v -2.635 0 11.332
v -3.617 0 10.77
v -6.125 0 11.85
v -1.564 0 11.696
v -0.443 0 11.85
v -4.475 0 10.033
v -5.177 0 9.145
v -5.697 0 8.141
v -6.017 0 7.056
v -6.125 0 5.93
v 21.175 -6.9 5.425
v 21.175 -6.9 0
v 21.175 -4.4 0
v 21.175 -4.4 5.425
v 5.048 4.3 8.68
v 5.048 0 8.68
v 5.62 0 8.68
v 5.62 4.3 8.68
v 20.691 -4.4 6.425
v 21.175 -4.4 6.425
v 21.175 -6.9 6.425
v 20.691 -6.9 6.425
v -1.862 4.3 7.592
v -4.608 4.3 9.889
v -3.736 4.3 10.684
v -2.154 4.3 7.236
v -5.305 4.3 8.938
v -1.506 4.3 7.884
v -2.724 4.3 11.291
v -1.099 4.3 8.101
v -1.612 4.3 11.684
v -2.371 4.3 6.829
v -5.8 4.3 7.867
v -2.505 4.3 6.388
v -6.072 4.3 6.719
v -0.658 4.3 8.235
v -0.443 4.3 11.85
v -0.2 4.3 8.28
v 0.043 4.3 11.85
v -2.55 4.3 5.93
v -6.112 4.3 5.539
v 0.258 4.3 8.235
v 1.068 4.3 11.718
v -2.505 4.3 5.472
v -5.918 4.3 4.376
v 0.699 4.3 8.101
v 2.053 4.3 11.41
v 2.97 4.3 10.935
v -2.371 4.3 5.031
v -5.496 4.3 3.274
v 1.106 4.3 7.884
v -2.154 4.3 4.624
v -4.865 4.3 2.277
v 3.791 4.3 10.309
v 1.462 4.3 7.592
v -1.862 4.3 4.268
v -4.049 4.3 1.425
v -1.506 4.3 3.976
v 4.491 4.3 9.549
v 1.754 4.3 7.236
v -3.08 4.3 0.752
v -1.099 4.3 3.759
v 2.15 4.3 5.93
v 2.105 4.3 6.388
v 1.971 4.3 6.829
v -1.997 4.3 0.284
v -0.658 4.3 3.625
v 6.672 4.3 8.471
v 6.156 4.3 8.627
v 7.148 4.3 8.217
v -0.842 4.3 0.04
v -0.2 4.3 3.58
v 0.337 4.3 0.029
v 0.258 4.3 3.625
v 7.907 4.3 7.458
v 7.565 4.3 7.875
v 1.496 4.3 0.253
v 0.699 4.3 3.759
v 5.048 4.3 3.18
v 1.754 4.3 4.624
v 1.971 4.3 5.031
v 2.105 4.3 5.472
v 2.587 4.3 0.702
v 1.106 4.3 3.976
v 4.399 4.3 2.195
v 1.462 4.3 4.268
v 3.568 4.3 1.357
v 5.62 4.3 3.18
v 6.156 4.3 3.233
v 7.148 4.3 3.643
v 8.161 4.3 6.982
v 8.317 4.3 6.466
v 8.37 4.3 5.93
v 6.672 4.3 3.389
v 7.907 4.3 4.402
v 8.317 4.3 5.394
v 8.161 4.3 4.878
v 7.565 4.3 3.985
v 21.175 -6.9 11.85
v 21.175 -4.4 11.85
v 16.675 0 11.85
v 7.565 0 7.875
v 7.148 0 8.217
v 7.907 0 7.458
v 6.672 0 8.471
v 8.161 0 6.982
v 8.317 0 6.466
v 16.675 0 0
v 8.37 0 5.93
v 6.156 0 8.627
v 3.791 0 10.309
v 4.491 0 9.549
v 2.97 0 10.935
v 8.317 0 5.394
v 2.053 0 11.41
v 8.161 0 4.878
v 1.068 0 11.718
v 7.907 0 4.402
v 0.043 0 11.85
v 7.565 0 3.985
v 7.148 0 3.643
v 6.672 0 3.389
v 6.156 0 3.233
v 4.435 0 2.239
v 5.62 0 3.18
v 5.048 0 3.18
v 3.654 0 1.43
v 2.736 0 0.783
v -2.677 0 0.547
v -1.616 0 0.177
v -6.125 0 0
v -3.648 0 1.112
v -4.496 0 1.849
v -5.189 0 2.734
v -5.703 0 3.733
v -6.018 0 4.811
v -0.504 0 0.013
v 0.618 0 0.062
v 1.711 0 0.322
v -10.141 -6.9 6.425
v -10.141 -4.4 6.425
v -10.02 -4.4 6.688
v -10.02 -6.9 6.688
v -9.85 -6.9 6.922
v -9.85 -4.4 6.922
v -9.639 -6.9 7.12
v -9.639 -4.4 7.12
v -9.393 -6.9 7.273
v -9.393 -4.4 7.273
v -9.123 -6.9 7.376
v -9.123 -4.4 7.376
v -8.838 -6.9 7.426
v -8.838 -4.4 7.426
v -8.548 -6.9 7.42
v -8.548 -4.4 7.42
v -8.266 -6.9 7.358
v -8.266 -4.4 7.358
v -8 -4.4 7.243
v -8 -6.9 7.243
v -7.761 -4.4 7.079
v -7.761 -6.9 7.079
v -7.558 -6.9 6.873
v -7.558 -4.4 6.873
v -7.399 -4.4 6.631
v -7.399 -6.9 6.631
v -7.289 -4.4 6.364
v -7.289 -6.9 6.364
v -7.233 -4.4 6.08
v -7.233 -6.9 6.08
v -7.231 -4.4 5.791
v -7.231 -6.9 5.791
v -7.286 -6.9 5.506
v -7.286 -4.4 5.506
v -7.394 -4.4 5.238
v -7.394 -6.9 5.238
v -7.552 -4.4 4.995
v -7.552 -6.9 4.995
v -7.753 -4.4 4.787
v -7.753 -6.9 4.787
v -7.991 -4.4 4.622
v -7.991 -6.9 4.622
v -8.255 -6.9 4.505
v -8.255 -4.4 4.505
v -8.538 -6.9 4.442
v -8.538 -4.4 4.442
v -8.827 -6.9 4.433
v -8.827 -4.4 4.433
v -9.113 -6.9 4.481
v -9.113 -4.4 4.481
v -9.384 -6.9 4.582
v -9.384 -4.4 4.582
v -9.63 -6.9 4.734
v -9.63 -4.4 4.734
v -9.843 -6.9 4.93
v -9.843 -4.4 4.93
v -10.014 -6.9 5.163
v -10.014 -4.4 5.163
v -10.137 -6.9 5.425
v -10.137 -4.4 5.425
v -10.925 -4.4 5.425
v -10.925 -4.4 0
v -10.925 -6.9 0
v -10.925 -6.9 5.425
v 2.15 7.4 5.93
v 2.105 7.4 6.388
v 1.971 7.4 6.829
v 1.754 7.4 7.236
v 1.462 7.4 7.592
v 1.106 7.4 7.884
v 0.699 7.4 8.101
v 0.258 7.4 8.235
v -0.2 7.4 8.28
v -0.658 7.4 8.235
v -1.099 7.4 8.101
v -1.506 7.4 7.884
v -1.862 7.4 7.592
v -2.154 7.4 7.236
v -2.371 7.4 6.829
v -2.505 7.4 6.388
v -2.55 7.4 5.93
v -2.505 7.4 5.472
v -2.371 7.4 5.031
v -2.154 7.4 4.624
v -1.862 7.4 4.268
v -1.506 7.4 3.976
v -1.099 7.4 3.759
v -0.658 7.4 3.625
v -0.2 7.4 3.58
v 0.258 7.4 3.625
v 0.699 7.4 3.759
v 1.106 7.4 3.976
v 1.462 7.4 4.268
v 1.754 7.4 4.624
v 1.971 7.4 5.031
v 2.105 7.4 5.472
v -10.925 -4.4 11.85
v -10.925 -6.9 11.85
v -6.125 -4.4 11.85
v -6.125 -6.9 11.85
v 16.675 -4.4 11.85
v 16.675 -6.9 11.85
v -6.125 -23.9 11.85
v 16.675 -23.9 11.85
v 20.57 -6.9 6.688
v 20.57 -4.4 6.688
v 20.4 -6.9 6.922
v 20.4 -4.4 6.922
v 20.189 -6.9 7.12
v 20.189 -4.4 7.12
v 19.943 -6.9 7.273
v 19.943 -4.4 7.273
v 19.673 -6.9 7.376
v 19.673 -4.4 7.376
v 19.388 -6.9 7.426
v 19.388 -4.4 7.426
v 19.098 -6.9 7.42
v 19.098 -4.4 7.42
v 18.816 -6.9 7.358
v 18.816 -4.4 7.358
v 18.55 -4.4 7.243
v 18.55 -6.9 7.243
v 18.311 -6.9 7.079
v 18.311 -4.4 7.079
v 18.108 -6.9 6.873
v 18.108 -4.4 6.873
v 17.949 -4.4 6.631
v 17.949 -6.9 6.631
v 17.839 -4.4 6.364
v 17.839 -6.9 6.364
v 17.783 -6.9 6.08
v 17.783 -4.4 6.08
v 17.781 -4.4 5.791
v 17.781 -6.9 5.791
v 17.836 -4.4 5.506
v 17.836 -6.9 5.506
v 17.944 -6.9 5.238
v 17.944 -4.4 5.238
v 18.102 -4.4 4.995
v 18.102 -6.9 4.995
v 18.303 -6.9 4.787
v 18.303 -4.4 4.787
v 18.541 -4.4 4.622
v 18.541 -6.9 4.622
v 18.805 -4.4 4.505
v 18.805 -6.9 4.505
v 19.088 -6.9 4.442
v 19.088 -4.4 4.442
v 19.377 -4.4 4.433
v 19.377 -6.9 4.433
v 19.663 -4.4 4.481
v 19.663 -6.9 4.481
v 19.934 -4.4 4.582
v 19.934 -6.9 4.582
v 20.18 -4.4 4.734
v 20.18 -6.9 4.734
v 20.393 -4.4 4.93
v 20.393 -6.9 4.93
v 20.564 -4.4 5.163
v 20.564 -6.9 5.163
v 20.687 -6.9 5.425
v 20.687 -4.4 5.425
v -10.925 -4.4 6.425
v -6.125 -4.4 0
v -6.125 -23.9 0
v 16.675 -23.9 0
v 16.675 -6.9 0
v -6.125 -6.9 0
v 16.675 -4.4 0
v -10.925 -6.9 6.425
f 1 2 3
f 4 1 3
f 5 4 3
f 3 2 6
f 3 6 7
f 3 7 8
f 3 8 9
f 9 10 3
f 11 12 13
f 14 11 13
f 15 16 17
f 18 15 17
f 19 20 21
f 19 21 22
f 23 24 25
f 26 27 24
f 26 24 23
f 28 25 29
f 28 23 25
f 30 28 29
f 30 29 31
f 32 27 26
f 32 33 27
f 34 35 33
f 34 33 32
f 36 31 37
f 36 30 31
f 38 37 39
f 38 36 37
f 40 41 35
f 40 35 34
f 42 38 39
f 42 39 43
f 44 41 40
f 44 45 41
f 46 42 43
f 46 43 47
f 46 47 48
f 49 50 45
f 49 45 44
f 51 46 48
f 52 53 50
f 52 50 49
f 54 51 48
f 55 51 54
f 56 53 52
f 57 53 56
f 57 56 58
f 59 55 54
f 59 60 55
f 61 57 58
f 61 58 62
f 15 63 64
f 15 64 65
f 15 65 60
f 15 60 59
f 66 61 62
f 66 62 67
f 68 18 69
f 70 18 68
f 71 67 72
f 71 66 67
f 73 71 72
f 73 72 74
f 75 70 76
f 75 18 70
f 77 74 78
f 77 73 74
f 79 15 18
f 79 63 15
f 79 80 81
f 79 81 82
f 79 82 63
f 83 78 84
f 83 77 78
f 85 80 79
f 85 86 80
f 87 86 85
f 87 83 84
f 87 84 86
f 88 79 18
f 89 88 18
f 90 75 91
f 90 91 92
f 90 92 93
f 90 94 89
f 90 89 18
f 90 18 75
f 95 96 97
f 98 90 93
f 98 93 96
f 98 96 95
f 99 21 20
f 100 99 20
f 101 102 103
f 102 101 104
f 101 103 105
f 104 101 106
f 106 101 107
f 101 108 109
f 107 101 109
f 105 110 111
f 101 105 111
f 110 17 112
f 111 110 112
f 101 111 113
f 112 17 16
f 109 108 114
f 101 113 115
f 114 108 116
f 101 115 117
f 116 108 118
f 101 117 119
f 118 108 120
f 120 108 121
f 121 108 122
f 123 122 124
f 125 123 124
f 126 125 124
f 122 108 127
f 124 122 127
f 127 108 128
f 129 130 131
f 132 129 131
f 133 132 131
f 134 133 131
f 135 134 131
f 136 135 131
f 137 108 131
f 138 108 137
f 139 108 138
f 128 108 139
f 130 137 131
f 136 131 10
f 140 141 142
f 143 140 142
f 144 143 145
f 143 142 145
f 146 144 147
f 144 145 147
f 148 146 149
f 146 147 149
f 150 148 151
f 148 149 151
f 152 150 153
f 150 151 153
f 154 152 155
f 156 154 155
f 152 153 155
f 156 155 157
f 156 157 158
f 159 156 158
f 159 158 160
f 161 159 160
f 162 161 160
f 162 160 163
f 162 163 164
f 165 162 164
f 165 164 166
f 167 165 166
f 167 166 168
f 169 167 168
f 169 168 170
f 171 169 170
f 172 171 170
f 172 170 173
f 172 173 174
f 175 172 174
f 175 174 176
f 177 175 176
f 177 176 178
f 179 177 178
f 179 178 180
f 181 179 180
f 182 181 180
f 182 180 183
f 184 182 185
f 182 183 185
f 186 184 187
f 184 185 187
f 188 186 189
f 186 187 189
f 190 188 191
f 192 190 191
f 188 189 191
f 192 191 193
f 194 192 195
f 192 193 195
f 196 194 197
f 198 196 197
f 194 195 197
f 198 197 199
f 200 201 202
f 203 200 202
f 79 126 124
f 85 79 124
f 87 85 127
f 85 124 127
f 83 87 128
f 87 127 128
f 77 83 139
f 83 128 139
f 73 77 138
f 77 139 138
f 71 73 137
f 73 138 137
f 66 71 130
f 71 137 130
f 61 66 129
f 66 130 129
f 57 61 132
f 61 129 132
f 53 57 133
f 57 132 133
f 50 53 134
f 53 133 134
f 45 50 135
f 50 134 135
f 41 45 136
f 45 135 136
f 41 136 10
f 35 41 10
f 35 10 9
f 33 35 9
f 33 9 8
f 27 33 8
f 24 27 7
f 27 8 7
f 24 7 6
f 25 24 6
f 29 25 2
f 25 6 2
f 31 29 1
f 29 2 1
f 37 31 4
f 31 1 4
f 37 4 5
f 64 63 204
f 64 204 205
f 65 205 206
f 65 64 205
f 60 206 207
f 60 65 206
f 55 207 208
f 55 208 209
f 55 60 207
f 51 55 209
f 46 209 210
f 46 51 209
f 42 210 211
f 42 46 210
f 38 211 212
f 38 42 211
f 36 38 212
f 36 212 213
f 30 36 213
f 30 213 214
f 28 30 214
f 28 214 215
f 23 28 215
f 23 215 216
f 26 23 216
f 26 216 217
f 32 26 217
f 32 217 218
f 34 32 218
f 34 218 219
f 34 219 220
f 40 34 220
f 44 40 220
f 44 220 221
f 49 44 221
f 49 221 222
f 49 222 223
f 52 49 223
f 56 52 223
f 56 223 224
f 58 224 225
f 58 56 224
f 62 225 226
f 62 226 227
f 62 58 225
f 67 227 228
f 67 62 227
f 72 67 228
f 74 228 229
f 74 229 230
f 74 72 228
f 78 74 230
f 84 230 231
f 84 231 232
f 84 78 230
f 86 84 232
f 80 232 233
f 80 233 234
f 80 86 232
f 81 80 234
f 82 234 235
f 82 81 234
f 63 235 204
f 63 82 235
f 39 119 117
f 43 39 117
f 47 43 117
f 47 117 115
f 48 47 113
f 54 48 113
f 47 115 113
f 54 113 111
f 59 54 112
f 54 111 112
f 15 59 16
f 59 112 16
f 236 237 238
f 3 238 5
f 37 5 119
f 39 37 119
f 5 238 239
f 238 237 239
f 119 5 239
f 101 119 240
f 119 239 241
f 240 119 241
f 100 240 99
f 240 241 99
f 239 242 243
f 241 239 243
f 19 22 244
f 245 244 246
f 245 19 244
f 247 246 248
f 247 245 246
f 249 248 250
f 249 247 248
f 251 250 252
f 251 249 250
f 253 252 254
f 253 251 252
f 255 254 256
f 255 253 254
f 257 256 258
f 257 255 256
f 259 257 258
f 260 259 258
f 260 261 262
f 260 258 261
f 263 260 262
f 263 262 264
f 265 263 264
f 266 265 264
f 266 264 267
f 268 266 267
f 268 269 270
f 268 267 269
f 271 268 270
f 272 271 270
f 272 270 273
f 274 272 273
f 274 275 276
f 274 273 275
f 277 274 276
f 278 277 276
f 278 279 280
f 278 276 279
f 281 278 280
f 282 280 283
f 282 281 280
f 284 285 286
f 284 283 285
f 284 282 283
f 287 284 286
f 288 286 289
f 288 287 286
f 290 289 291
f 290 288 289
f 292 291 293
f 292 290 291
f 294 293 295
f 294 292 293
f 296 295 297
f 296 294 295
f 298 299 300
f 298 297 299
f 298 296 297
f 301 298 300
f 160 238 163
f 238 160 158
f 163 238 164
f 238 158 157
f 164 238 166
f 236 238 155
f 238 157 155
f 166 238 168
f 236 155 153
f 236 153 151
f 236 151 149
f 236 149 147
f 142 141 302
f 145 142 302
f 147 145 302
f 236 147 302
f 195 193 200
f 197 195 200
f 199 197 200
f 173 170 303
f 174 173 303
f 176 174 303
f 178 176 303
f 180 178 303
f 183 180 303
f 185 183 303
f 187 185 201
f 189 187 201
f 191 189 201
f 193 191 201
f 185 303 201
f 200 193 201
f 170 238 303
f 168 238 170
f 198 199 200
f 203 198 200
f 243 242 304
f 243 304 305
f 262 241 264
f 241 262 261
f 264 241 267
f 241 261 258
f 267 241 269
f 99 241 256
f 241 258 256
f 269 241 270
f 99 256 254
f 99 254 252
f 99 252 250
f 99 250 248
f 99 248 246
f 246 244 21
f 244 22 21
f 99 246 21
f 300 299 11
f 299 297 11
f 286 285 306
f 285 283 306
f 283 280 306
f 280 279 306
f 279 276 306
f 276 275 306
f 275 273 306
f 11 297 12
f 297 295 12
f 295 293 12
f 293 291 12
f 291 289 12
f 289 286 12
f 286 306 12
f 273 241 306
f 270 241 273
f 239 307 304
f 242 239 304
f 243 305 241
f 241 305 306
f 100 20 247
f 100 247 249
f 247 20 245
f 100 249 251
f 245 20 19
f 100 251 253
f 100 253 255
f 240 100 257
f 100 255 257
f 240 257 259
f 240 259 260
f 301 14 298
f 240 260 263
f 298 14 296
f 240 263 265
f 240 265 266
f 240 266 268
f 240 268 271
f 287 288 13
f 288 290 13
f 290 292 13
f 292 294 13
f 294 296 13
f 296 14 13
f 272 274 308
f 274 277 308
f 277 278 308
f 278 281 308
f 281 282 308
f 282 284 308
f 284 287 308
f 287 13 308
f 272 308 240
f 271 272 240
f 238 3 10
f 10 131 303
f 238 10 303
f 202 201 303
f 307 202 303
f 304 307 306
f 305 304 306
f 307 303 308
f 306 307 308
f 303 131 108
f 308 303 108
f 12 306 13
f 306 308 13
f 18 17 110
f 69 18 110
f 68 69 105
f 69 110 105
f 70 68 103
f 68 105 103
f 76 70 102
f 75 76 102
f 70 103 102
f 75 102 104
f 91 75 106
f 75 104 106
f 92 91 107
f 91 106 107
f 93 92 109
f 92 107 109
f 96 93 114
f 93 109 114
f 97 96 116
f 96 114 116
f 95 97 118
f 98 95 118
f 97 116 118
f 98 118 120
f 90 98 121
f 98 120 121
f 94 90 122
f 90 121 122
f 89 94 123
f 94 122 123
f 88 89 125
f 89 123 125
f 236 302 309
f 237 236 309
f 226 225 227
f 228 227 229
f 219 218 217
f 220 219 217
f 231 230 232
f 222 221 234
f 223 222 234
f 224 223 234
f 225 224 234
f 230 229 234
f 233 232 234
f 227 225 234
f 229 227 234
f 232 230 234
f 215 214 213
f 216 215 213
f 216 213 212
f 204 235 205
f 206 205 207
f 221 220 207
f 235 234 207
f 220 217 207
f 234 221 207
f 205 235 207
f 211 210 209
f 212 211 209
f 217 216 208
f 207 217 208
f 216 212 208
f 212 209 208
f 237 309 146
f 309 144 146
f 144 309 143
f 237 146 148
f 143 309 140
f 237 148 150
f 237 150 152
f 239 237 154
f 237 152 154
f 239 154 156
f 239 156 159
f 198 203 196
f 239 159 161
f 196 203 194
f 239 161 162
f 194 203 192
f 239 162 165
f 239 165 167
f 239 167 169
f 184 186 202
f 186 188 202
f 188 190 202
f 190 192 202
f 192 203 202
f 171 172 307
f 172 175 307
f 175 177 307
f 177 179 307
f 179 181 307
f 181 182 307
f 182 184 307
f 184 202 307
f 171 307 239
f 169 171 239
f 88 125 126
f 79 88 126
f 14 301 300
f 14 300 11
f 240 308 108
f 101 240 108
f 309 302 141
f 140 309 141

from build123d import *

# Parameters (mm, degrees)
BOSS_EXTRUDE1_DEPTH = 11.85
BOSS_EXTRUDE2_DEPTH = 4.3
SKETCH4_R           = 2.35
BOSS_EXTRUDE3_DEPTH = 31.3
CUT_EXTRUDE1_DEPTH  = 32.1


with BuildPart() as part:
    # Sketch1 → Boss-Extrude1 (new body)
    with BuildSketch(Plane.XY):
        Polygon((0, 0), (-6.125, 0), (-6.125, -4.4), (-10.925, -4.4), (-10.925, -6.9), (-6.125, -6.9), (-6.125, -23.9), (16.675, -23.9), (16.675, -6.9), (21.175, -6.9), (21.175, -4.4), (16.675, -4.4), (16.675, 0), align=None)
    extrude(amount=BOSS_EXTRUDE1_DEPTH)

    # Boss-Extrude2: read off the stored shape, not the designer's step
    # Boss-Extrude2 outline → Boss-Extrude2 (add)
    with BuildSketch(Plane(origin=(0, 0, 0), x_dir=(1, 0, 0), z_dir=(0, 1, 0))):
        with BuildLine():
            Line((5.048154438, -8.68), (5.62, -8.68))
            ThreePointArc((5.62, -8.68), (8.37, -5.93), (5.62, -3.18))
            Line((5.62, -3.18), (5.048154438, -3.18))
            ThreePointArc((5.048154438, -3.18), (-5.20541828, -2.759603678), (-0.44336187, -11.85))
            Line((-0.44336187, -11.85), (0.04336187, -11.85))
            ThreePointArc((0.04336187, -11.85), (2.970396322, -10.93541828), (5.048154438, -8.68))
        make_face()
    extrude(amount=BOSS_EXTRUDE2_DEPTH)

    # Sketch4 → Boss-Extrude3 (add)
    with BuildSketch(Plane.XZ.offset(23.9)):
        with Locations((-0.2, 5.93)):
            Circle(SKETCH4_R)
    extrude(amount=-BOSS_EXTRUDE3_DEPTH)

    # Sketch5 → Cut-Extrude1 (cut)
    with BuildSketch(Plane(origin=(0, -4.4, 0), x_dir=(1, 0, 0), z_dir=(0, 1, 0))):
        with BuildLine():
            Line((-10.137435839, -5.425), (-10.925, -5.425))
            Line((-10.925, -5.425), (-10.925, -5.925))
            Line((-10.925, -5.925), (-10.925, -6.425))
            Line((-10.925, -6.425), (-10.140971398, -6.425))
            ThreePointArc((-10.140971398, -6.425), (-7.225009375, -5.935303305), (-10.137435839, -5.425))
        make_face()
        with BuildLine():
            Line((20.687435839, -5.425), (21.475, -5.425))
            Line((21.475, -5.425), (21.475, -5.925))
            Line((21.475, -5.925), (21.475, -6.425))
            Line((21.475, -6.425), (20.690971398, -6.425))
            ThreePointArc((20.690971398, -6.425), (17.775009375, -5.935303305), (20.687435839, -5.425))
        make_face()
    extrude(amount=-CUT_EXTRUDE1_DEPTH, mode=Mode.SUBTRACT)


solid = part.part
